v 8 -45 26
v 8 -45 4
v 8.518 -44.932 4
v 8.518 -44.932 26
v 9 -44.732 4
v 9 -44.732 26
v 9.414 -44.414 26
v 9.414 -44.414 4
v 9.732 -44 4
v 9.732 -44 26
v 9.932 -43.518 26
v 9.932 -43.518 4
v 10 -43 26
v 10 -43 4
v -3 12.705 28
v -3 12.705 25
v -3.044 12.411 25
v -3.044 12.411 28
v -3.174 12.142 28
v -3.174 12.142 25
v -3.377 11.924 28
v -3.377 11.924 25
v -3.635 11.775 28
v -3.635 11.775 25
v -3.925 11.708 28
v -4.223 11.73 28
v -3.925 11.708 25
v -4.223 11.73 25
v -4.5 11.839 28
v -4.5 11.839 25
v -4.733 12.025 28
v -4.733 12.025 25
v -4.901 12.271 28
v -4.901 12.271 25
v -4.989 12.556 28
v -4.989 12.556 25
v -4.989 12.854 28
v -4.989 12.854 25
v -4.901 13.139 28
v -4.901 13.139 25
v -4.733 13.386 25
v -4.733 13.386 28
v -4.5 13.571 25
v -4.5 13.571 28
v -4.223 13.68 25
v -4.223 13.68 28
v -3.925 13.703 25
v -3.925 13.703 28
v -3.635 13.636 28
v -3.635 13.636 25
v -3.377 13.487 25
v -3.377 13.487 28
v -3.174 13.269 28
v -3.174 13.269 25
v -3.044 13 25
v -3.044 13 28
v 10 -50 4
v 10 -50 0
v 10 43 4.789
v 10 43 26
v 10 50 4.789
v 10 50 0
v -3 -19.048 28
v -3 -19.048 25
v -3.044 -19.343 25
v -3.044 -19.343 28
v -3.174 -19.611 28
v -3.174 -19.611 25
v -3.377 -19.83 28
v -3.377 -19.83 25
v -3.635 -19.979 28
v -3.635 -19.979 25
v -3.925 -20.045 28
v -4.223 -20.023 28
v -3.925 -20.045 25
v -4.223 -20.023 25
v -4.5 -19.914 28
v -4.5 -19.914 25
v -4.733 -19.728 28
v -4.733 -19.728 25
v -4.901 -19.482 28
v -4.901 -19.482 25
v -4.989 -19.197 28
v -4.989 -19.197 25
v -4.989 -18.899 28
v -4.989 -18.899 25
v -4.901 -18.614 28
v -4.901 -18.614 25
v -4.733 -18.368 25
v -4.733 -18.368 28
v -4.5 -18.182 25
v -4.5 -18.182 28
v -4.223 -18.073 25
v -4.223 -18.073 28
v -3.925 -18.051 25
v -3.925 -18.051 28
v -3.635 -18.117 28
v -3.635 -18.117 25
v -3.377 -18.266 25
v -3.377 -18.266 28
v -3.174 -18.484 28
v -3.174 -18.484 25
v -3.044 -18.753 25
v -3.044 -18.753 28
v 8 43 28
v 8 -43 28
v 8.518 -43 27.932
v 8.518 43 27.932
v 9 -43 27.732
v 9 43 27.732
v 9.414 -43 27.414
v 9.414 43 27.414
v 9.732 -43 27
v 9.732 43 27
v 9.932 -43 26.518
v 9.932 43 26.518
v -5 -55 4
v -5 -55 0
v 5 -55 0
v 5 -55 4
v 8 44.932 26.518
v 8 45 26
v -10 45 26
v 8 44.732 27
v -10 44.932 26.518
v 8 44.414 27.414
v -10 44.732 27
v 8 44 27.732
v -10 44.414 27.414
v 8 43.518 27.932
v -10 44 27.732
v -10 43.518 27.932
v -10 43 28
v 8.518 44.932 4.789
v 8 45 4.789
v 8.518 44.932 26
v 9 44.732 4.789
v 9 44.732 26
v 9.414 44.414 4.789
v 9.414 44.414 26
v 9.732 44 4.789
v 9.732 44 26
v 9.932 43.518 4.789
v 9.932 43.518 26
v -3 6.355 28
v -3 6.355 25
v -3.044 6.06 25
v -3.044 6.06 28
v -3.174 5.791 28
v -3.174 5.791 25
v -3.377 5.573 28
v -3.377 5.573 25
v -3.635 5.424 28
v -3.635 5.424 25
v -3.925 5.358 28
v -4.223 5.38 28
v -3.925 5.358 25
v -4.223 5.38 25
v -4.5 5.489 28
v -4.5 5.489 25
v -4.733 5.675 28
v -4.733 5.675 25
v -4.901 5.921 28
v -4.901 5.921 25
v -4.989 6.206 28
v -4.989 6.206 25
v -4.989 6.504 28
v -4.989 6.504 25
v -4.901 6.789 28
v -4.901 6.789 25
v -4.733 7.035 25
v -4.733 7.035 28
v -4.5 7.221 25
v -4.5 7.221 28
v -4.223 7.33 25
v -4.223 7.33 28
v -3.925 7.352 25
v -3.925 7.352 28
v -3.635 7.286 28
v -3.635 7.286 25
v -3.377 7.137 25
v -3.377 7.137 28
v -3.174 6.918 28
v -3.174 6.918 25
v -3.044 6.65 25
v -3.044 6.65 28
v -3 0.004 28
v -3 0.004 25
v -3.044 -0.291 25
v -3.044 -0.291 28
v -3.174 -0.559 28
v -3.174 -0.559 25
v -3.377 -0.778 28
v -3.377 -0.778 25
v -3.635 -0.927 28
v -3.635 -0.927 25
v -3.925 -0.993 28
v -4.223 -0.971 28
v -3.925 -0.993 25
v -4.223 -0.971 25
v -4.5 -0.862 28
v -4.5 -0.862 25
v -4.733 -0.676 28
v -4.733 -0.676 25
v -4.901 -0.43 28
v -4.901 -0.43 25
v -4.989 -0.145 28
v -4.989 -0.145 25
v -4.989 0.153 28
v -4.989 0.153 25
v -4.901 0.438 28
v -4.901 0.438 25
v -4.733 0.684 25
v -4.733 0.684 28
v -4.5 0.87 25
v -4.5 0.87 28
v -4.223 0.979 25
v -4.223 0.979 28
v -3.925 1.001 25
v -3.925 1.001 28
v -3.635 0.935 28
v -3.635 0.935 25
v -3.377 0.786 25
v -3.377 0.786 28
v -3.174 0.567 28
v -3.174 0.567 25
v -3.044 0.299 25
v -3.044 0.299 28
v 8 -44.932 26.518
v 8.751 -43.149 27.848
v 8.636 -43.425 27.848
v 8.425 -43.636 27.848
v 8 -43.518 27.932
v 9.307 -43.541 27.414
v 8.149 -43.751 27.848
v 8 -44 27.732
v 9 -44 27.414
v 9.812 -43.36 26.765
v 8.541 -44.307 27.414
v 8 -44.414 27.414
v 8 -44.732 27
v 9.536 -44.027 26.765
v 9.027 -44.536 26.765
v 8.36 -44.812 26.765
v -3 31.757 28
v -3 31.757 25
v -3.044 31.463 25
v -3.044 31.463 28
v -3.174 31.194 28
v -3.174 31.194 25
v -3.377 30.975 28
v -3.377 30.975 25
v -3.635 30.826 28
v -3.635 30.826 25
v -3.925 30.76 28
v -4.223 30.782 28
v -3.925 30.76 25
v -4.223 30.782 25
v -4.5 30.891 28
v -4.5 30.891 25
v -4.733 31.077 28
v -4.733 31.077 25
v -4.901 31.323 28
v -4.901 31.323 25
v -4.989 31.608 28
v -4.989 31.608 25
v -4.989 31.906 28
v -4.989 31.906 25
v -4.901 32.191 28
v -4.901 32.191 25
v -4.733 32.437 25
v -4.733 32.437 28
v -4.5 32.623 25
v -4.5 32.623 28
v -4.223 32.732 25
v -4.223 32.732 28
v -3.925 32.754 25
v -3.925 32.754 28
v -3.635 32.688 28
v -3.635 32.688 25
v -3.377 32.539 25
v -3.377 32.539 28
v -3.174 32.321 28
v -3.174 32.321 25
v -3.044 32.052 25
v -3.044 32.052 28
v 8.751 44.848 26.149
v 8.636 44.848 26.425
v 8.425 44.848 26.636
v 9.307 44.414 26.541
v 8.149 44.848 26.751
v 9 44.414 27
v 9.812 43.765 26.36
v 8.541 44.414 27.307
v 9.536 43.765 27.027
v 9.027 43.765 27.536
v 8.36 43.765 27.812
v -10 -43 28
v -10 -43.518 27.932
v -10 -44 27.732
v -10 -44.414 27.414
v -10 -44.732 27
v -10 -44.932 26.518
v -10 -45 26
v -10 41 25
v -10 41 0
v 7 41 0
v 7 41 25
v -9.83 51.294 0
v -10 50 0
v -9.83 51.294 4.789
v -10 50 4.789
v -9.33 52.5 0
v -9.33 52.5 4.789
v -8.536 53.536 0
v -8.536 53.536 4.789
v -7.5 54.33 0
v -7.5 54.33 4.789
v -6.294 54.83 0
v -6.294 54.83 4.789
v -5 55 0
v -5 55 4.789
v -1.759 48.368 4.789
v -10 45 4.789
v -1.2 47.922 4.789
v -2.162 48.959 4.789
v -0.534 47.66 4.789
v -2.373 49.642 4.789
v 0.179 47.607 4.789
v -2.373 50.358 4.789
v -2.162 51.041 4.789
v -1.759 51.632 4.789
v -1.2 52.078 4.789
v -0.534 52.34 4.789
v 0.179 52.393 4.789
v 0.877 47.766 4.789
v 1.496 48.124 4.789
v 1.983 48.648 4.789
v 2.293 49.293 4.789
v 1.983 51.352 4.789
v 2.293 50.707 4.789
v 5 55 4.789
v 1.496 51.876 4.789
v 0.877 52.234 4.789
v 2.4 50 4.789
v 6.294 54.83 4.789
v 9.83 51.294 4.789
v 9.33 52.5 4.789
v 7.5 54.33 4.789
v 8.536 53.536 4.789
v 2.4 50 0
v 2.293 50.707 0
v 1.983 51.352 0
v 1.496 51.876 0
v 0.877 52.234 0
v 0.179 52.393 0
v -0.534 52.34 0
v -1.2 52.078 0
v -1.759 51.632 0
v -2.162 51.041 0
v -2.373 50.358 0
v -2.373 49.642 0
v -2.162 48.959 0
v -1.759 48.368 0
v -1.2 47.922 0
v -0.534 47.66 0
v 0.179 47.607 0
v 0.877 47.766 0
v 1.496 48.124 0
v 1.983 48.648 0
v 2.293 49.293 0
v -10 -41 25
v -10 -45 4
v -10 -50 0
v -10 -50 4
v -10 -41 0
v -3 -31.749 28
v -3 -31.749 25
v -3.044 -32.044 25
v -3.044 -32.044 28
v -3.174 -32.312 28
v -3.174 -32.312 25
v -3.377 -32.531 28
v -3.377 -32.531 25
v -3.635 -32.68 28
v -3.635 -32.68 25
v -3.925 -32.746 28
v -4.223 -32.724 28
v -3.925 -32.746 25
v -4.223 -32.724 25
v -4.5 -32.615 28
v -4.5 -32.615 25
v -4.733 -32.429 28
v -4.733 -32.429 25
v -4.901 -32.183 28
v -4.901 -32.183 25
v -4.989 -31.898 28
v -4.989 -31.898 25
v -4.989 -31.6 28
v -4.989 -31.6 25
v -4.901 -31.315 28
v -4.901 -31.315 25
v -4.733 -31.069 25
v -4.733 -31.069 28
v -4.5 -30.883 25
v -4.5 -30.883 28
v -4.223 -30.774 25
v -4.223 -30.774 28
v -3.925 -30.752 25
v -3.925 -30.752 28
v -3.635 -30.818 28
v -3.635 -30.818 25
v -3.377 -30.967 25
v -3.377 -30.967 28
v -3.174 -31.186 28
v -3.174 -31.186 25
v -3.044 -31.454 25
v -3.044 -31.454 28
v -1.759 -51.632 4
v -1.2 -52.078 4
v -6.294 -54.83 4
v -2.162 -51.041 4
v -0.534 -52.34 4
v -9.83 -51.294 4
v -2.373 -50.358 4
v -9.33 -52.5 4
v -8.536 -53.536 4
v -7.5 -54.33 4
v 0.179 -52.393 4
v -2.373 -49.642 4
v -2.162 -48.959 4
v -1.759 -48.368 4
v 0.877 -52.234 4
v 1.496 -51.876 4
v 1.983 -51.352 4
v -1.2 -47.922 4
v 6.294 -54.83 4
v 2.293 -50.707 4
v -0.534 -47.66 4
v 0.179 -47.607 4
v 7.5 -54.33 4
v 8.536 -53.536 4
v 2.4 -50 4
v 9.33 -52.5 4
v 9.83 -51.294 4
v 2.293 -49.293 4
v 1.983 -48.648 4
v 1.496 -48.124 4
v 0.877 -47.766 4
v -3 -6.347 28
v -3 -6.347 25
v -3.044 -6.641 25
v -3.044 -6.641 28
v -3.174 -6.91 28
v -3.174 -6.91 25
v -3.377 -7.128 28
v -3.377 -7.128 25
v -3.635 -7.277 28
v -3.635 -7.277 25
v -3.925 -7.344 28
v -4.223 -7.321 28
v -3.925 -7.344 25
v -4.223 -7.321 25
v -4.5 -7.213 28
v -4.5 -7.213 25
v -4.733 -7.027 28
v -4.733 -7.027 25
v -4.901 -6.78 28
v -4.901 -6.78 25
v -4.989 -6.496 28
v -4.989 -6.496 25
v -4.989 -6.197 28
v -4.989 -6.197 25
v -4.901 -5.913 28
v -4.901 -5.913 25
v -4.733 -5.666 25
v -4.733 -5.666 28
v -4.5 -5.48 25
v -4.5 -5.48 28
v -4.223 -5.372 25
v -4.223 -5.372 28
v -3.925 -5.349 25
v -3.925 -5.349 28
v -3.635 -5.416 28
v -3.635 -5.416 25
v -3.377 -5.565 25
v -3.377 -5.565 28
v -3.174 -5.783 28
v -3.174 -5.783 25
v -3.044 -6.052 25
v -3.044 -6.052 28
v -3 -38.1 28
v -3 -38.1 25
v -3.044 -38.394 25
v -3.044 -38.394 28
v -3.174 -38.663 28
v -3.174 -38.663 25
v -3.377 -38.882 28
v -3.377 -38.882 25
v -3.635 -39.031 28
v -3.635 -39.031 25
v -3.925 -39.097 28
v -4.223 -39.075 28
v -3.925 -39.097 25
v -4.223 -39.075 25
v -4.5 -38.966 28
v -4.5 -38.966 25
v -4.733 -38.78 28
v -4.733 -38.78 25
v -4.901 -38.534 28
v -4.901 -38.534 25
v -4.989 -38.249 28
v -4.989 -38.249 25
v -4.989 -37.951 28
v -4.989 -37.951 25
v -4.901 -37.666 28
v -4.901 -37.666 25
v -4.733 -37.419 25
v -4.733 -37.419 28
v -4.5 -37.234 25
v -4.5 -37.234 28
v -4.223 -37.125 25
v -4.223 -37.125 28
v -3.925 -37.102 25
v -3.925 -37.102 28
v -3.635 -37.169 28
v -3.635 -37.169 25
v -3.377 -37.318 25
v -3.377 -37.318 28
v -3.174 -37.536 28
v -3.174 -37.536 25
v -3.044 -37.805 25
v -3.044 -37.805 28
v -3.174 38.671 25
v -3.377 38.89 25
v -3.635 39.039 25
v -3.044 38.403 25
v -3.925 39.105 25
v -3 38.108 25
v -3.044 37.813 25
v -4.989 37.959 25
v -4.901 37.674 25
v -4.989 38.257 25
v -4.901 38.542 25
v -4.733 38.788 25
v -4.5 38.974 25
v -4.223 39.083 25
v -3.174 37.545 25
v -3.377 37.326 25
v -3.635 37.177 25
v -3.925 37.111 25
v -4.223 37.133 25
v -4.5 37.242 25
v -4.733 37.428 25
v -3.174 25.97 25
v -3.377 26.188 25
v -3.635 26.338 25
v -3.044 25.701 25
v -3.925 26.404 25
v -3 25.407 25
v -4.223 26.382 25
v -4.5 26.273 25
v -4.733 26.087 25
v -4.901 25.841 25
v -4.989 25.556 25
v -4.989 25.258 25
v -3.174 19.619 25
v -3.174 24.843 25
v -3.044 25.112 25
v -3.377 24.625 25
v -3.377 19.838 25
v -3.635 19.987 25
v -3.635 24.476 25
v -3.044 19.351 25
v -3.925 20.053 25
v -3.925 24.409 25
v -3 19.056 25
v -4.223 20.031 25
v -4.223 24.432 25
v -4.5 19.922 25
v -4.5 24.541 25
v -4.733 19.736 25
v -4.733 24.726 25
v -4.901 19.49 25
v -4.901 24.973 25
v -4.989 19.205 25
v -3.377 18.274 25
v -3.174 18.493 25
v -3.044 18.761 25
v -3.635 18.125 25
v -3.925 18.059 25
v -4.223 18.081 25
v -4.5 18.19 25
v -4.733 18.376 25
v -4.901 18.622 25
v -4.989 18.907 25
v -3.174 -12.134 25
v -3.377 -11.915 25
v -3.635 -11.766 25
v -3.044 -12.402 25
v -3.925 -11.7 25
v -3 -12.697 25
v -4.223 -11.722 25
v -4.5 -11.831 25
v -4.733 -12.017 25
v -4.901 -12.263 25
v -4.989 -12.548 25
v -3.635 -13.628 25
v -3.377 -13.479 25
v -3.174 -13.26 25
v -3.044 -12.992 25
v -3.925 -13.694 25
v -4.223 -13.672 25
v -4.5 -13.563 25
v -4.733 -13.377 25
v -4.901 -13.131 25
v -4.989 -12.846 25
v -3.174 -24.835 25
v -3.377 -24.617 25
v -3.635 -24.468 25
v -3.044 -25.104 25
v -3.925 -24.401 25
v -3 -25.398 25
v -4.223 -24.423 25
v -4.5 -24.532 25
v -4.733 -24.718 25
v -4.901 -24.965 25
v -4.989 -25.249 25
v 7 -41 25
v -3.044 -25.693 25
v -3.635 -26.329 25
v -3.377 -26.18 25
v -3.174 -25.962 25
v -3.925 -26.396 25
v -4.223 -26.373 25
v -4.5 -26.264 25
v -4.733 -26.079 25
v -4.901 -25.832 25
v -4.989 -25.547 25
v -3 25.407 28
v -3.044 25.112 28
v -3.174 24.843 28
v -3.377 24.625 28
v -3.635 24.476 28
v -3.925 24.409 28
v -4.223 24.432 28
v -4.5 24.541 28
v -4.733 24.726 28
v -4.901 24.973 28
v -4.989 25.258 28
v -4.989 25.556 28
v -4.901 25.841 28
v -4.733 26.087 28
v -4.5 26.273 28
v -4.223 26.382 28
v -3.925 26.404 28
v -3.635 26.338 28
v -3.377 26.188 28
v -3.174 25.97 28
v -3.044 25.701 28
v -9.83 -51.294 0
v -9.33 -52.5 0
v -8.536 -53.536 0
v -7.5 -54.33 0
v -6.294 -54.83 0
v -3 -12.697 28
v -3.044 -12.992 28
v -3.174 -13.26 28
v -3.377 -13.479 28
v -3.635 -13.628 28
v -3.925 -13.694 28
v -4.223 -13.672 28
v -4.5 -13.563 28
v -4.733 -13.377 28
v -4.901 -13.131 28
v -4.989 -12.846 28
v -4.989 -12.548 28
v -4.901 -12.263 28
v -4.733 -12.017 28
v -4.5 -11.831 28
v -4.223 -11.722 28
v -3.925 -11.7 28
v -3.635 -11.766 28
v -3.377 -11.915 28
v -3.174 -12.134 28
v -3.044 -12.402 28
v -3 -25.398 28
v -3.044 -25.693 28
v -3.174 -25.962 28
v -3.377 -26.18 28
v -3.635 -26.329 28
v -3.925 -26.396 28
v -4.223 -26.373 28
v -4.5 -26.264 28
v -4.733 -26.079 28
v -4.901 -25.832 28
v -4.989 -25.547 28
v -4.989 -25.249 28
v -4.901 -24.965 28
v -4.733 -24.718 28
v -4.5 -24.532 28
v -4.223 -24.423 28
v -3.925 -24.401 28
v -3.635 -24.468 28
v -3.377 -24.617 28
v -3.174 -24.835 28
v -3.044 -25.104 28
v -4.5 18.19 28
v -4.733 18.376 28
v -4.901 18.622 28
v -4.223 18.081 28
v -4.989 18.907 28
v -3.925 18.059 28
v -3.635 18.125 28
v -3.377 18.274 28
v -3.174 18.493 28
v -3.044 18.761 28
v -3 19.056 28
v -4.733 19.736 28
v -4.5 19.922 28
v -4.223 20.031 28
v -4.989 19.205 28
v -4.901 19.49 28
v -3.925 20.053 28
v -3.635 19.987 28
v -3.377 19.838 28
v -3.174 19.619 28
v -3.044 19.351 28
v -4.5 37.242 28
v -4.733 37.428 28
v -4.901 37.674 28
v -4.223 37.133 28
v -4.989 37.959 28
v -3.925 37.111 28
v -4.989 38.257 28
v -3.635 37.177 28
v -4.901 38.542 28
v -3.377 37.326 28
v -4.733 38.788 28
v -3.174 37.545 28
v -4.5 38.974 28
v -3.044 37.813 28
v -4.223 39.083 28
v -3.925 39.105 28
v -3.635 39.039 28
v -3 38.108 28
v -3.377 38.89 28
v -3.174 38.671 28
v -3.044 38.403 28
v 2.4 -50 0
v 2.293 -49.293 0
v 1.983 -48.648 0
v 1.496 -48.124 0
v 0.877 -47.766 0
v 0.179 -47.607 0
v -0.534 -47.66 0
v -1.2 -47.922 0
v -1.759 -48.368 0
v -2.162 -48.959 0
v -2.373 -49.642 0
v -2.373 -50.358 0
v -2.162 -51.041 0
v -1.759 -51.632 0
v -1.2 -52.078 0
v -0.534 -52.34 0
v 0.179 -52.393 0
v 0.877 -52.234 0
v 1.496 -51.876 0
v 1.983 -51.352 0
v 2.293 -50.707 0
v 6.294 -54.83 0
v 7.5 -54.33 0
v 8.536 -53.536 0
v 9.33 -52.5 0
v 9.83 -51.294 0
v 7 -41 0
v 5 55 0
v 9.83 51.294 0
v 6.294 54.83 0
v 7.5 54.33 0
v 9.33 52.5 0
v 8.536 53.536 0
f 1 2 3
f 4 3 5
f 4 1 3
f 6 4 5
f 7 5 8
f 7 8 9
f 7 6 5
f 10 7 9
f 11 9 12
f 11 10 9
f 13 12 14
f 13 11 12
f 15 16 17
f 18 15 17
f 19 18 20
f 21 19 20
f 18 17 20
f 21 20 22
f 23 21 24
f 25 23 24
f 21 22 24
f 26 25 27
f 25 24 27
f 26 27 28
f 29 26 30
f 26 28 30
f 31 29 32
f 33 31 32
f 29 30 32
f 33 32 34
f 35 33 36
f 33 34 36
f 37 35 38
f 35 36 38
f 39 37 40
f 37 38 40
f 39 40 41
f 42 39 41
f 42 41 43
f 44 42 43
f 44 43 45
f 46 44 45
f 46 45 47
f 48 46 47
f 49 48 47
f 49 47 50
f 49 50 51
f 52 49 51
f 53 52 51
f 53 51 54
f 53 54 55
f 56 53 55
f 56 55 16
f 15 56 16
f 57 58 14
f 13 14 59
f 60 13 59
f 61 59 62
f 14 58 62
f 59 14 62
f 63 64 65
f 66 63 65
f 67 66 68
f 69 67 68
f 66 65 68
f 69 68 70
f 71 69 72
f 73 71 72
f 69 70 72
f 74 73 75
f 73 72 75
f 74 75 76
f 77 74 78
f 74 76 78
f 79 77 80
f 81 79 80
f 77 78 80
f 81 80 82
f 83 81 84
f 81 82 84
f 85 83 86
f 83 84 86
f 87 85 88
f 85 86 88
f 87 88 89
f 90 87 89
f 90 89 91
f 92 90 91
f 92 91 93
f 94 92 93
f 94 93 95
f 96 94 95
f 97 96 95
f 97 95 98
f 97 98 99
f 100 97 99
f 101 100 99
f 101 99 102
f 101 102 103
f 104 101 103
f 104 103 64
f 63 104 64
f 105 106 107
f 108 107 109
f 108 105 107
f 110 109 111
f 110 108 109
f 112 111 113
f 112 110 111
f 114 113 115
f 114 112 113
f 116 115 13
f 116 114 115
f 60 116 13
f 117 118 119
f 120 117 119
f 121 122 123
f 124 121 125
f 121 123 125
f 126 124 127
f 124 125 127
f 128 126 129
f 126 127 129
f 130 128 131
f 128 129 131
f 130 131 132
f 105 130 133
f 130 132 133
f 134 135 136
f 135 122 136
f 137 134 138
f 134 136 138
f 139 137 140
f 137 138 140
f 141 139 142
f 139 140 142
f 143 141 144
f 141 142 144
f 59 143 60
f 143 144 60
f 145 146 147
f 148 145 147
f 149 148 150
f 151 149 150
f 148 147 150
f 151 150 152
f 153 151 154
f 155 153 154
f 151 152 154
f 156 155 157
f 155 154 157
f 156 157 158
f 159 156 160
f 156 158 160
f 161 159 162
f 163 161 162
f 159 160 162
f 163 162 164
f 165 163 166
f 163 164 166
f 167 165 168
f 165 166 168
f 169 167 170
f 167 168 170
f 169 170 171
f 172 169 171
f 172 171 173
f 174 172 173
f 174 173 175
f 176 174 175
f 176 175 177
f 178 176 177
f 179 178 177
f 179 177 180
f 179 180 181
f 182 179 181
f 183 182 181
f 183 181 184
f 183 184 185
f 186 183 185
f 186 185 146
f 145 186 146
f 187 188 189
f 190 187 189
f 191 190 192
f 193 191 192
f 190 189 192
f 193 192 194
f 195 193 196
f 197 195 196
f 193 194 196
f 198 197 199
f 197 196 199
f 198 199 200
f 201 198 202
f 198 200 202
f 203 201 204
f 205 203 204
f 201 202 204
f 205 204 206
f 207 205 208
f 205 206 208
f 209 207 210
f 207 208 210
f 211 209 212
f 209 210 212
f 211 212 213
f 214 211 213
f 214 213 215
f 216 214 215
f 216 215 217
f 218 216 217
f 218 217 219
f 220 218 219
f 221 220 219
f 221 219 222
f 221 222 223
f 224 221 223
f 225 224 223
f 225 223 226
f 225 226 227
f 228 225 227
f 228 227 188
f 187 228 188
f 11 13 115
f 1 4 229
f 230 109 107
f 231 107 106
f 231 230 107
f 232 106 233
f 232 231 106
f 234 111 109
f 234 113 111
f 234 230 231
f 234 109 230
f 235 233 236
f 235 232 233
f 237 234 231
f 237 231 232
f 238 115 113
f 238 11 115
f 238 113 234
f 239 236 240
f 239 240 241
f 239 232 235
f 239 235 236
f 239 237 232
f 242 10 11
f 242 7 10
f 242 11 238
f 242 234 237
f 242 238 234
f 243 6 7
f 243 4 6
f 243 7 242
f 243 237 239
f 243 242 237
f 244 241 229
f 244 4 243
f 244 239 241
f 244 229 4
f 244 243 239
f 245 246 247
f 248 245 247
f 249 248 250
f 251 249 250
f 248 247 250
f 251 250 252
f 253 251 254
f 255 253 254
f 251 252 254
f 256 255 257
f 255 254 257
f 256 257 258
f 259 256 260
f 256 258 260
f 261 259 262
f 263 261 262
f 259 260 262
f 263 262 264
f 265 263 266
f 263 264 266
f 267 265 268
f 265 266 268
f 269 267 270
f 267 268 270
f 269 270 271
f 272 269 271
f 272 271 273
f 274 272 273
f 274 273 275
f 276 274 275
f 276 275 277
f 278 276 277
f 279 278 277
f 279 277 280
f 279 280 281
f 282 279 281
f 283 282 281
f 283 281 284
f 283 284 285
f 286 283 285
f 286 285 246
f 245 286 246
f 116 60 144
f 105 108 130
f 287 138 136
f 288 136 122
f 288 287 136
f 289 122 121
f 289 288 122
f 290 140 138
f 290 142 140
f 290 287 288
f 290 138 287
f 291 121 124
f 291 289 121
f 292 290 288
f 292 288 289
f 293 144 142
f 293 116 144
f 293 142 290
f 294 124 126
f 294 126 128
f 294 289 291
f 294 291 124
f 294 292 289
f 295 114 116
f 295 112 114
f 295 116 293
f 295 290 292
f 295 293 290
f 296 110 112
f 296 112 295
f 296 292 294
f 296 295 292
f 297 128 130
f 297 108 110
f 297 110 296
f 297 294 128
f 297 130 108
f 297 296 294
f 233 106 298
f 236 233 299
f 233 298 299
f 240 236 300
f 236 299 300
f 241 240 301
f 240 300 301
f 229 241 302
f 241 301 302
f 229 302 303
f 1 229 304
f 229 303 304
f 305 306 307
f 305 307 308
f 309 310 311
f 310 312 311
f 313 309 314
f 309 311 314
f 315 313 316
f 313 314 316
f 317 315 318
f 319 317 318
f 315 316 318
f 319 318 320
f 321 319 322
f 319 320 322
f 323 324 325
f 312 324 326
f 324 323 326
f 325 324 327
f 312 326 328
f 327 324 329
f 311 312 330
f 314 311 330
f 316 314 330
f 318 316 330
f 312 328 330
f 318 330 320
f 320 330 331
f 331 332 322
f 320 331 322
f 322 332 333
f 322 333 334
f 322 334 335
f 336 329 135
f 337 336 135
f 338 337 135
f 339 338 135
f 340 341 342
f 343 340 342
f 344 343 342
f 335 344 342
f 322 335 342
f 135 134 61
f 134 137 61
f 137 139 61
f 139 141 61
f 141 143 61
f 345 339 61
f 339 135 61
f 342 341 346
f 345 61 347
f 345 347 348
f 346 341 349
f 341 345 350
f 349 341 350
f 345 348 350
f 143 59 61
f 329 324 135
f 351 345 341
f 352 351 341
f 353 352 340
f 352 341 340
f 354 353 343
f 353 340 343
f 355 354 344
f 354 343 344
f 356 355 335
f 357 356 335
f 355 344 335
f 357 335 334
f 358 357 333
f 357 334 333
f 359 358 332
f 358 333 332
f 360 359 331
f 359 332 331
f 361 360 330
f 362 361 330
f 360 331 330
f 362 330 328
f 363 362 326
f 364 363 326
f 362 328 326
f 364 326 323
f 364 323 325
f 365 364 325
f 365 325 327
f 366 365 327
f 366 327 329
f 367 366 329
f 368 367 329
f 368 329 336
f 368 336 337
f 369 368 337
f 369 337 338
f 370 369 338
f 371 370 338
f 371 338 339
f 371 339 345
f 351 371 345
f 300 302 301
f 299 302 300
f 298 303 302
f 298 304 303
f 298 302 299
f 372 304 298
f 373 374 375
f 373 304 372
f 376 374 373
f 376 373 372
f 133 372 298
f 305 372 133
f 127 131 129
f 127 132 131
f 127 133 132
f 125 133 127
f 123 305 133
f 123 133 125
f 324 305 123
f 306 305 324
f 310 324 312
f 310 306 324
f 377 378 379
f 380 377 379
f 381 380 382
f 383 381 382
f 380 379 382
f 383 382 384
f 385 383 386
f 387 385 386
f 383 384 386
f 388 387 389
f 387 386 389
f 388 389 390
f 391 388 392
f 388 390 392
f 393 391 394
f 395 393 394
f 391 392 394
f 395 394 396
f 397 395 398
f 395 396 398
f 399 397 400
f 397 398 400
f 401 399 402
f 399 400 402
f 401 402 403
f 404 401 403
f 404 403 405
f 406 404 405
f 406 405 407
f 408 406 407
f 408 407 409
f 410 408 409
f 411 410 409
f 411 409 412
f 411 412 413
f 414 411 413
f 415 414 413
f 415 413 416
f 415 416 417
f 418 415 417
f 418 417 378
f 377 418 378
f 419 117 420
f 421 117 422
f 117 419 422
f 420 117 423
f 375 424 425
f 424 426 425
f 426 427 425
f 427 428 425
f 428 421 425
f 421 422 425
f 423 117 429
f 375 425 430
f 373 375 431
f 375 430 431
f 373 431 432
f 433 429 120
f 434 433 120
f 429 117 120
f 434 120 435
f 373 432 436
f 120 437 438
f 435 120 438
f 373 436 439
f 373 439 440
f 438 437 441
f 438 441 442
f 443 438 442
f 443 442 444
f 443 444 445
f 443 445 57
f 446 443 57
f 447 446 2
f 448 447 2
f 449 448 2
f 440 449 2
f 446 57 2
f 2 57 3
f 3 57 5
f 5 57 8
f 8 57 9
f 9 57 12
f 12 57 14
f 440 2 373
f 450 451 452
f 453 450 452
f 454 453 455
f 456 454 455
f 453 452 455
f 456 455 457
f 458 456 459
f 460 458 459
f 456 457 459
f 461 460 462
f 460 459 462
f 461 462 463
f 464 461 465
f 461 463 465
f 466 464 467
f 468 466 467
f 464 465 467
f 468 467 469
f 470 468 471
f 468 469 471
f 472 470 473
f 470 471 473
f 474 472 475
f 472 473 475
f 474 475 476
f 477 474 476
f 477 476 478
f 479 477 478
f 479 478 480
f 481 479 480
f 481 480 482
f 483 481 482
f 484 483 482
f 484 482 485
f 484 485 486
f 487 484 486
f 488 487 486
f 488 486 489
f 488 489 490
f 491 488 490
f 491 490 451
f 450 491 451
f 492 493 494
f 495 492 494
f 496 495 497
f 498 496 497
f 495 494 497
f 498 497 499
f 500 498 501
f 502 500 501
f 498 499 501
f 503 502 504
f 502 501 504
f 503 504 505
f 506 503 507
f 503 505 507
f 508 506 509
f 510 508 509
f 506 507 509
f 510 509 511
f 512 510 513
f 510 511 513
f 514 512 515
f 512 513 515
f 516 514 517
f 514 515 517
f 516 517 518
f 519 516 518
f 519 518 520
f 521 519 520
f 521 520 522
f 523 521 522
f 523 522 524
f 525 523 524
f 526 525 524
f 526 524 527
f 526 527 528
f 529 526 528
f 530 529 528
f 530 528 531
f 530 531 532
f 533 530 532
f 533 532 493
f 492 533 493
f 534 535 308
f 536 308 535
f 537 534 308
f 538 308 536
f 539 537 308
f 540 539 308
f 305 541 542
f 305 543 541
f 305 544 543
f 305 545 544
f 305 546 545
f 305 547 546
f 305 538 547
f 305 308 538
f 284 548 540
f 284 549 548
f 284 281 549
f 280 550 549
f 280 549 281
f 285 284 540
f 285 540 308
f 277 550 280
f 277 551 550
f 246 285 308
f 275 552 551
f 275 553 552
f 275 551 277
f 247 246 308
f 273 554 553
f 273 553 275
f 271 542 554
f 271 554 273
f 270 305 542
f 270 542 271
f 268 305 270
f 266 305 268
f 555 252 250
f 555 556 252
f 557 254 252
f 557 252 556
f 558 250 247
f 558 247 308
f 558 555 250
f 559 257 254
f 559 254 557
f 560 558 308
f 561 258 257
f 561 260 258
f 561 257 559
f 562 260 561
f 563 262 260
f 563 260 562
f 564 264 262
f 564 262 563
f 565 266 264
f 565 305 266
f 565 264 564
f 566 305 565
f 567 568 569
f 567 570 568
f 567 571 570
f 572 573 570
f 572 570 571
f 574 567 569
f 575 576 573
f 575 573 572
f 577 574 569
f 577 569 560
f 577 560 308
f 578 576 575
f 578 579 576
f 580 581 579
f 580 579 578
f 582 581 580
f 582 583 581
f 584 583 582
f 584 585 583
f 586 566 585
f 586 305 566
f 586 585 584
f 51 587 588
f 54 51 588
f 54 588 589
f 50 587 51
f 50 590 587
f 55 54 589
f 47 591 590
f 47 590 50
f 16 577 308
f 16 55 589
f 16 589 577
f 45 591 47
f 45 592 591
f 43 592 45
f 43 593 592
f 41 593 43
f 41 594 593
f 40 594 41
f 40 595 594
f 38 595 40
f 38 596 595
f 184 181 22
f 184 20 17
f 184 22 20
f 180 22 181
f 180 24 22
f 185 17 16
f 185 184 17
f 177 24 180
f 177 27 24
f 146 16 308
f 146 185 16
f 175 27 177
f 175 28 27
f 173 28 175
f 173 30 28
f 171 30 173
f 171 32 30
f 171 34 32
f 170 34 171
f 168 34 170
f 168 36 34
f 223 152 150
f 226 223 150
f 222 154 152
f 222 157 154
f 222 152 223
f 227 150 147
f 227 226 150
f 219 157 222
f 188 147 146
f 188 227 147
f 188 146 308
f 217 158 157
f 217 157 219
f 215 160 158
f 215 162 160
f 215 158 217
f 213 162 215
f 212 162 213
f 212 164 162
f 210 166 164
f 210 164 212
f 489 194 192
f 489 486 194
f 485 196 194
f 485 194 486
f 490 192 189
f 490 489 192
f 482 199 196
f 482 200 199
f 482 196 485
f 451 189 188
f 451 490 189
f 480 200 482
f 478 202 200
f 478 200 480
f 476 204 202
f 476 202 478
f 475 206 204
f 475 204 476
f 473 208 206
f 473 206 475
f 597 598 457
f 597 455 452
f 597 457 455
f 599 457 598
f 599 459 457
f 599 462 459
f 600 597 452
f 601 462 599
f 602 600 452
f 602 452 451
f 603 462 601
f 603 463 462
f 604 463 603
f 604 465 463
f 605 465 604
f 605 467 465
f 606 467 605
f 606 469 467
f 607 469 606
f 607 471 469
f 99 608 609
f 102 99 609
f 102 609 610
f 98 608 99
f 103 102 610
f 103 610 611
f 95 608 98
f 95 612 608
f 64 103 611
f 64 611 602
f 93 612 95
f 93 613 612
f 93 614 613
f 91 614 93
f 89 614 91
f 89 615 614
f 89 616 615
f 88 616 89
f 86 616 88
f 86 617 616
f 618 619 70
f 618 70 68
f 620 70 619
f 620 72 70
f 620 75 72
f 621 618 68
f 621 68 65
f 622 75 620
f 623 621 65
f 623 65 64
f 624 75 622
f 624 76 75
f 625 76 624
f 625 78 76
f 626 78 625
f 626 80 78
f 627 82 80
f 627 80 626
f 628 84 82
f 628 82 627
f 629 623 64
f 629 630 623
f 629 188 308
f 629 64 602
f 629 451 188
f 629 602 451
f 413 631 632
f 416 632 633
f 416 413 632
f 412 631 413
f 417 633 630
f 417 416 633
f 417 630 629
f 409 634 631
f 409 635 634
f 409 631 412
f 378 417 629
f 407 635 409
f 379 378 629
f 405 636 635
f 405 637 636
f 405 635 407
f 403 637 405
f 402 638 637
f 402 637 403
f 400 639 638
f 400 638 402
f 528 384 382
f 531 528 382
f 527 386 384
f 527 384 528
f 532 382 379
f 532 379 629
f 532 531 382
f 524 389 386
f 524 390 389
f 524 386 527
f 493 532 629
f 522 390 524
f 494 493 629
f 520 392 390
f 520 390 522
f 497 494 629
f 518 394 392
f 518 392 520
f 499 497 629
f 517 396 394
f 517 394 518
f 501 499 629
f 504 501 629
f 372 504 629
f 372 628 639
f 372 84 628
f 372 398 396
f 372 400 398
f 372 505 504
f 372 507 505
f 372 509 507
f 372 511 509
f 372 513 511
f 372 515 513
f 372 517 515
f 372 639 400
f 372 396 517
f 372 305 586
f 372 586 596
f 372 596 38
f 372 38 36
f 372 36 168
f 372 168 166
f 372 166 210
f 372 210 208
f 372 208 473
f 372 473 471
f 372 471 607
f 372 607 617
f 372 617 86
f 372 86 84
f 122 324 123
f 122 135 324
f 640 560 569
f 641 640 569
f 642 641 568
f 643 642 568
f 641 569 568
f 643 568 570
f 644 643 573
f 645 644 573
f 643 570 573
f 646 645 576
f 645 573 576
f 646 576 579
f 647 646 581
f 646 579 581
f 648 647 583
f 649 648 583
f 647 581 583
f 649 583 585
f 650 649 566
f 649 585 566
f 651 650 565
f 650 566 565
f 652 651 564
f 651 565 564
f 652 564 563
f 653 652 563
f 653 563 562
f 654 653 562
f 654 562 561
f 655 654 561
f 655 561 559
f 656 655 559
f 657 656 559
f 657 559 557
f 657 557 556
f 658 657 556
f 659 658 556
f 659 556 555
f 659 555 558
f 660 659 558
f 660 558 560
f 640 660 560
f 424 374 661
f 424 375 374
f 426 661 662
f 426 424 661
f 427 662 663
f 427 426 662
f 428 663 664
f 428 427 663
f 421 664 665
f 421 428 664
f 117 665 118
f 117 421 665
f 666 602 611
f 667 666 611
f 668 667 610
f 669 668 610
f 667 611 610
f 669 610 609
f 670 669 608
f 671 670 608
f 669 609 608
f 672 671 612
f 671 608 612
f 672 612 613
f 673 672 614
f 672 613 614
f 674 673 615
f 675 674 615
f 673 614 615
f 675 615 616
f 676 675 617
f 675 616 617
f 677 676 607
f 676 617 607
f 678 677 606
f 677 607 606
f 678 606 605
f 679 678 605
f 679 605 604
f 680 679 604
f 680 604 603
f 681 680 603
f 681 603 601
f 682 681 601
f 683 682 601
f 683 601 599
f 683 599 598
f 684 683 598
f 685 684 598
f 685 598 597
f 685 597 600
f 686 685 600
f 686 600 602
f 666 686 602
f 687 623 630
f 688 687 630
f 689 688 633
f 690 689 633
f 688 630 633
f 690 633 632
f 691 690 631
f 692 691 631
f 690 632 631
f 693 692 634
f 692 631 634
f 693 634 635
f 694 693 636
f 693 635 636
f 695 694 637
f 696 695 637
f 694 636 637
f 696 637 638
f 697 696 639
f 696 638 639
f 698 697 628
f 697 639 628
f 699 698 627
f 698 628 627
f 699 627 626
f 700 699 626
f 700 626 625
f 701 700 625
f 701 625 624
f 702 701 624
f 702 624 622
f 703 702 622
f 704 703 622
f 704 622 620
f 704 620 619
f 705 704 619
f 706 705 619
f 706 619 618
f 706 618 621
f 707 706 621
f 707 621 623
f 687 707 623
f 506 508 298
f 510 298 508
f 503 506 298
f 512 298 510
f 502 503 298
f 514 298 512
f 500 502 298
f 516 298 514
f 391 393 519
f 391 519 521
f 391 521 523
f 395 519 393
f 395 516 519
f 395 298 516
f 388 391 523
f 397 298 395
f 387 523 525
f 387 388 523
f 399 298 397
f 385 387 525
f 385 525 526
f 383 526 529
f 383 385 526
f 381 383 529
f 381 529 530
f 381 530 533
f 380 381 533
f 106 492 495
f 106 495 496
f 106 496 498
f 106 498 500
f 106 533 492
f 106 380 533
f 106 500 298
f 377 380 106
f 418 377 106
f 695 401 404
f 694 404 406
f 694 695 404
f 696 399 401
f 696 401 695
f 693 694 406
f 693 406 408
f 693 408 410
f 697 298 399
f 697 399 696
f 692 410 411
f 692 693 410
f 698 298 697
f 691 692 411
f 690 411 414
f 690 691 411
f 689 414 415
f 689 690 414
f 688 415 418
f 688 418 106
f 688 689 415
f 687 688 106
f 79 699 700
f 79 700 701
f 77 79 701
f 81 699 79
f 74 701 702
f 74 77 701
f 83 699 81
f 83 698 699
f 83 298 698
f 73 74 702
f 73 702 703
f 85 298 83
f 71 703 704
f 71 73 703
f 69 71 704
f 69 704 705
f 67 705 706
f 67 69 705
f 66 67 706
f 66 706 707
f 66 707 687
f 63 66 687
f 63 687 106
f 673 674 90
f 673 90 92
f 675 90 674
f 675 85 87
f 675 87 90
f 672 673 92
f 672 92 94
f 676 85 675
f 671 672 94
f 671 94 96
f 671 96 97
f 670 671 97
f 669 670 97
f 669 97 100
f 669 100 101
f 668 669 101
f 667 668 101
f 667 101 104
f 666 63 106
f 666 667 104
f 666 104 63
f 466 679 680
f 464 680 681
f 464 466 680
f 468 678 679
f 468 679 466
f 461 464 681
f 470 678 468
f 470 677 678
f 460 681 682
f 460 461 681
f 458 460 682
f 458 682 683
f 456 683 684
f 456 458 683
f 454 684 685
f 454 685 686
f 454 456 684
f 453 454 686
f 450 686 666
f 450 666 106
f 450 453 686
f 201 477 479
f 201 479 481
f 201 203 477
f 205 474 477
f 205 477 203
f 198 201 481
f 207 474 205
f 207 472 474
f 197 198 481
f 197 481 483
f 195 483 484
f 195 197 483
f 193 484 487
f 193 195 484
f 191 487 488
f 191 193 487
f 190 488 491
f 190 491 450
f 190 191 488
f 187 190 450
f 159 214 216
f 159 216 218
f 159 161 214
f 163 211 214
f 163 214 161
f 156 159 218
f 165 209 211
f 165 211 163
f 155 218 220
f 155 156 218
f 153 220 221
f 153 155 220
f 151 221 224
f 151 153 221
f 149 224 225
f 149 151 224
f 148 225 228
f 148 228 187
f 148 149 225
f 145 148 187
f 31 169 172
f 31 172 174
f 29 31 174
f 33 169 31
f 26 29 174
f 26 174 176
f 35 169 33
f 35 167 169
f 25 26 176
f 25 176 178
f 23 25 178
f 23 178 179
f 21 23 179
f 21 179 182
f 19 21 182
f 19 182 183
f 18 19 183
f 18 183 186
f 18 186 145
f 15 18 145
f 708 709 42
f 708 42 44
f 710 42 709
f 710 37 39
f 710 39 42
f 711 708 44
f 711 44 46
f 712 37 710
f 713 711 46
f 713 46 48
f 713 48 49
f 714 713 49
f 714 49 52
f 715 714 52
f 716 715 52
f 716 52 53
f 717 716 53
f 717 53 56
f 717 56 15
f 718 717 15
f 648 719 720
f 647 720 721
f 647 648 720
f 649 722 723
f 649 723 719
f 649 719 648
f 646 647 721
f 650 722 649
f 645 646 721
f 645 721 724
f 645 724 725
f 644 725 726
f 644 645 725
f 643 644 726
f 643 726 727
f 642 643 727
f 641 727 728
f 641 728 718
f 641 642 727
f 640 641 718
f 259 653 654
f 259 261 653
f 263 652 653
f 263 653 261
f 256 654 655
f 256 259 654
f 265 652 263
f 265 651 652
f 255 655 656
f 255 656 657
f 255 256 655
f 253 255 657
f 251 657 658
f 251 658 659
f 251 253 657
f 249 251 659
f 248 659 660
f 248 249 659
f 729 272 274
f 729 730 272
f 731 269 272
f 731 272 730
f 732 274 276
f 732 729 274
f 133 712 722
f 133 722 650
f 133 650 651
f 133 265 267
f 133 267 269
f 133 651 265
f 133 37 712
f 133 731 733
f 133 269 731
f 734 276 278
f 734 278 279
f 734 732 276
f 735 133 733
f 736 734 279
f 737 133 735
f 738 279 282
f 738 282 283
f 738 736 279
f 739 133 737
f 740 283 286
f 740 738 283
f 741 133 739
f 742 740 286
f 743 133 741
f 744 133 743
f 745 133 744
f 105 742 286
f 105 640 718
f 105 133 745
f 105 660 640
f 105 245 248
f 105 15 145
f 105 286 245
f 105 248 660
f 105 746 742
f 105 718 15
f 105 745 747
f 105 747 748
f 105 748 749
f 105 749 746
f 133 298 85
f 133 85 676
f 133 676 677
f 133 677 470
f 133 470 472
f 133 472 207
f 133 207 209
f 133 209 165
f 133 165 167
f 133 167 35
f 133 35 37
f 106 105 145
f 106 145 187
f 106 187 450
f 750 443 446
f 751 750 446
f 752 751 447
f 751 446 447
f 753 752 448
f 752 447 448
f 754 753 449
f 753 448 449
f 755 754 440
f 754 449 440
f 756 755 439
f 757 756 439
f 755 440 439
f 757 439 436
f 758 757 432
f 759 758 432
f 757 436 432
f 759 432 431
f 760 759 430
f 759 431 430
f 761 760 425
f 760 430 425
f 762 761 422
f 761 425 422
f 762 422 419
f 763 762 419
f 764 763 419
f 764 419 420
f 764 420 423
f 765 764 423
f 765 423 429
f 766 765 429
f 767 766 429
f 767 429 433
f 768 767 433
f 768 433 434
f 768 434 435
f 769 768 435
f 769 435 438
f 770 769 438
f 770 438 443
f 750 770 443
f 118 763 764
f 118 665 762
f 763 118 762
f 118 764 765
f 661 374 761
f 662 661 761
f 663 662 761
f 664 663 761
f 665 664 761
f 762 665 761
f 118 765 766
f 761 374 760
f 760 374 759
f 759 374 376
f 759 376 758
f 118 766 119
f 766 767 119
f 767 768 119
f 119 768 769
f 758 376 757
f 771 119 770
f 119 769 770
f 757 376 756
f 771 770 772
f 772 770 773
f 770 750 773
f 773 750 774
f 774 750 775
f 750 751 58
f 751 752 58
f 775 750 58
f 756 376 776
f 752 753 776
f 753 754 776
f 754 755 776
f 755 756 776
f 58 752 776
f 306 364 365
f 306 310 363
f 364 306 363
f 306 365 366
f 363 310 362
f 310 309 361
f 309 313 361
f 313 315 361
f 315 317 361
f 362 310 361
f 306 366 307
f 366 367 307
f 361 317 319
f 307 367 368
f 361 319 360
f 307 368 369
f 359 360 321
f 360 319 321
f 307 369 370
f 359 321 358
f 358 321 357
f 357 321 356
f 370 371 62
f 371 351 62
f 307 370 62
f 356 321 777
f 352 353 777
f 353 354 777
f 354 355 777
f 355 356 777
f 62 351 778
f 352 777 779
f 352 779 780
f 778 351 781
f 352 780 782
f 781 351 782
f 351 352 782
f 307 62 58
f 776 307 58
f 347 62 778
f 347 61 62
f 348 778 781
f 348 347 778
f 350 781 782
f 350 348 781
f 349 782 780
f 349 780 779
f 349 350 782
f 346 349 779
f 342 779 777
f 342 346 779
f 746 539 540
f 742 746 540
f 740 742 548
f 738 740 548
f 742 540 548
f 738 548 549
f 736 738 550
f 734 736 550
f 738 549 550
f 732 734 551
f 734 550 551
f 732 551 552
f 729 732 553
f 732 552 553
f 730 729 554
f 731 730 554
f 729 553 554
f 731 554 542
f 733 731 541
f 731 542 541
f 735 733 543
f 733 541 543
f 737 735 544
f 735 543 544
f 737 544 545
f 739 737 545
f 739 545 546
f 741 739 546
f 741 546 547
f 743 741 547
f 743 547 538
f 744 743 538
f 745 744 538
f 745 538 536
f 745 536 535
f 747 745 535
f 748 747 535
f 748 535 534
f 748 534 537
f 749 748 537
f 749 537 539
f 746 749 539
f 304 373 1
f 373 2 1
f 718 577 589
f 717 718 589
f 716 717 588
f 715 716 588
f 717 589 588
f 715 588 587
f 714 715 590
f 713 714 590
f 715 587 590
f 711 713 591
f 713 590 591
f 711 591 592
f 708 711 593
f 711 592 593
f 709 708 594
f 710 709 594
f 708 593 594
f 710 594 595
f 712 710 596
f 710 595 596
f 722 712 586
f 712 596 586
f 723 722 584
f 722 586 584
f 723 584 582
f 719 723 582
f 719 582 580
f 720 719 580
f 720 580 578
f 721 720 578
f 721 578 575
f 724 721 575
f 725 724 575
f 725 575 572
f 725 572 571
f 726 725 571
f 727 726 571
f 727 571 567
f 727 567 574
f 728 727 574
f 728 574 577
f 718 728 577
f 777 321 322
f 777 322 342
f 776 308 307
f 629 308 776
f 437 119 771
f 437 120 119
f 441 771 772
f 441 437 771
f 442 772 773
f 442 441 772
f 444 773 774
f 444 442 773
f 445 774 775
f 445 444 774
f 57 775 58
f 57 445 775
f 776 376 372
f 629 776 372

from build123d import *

# Parameters (mm, degrees)
SKETCH_W        = 20
SKETCH_H        = 110
PAD_DEPTH       = 28
SKETCH003_R     = 1
POCKET_DEPTH    = 28.001
SKETCH004_W     = 14
SKETCH004_H     = 25
SKETCH004_W_2   = 12.717113
SKETCH004_H_2   = 24.211324
POCKET001_DEPTH = 20.001
SKETCH005_W     = 82
SKETCH005_H     = 26
POCKET002_DEPTH = 17
SKETCH006_R     = 2.4
POCKET003_DEPTH = 5
FILLET_R        = 2
FILLET001_R     = 5


with BuildPart() as part:
    # Sketch → Pad (new body)
    with BuildSketch(Plane.XY):
        Rectangle(SKETCH_W, SKETCH_H)
    extrude(amount=PAD_DEPTH)

    # Sketch003 → Pocket (cut, through all)
    with BuildSketch(Plane(origin=(0, 0, 0), x_dir=(1, 0, 0), z_dir=(0, 0, -1))):
        with Locations((-4, -0.004117)):
            Circle(SKETCH003_R)
        with Locations((-4, 6.346514)):
            Circle(SKETCH003_R)
        with Locations((-4, 12.697146)):
            Circle(SKETCH003_R)
        with Locations((-4, -6.354749)):
            Circle(SKETCH003_R)
        with Locations((-4, 19.047777)):
            Circle(SKETCH003_R)
        with Locations((-4, 25.398409)):
            Circle(SKETCH003_R)
        with Locations((-4, 31.74904)):
            Circle(SKETCH003_R)
        with Locations((-4, 38.099672)):
            Circle(SKETCH003_R)
        with Locations((-4, -38.107906)):
            Circle(SKETCH003_R)
        with Locations((-4, -12.70538)):
            Circle(SKETCH003_R)
        with Locations((-4, -19.056012)):
            Circle(SKETCH003_R)
        with Locations((-4, -25.406643)):
            Circle(SKETCH003_R)
        with Locations((-4, -31.757274)):
            Circle(SKETCH003_R)
    extrude(amount=-POCKET_DEPTH, mode=Mode.SUBTRACT)

    # Sketch004 → Pocket001 (cut, through all)
    with BuildSketch(Plane.YZ.offset(10)):
        with Locations((-52, 16.5)):
            Rectangle(SKETCH004_W, SKETCH004_H)
        with Locations((51.358556, 16.894338)):
            Rectangle(SKETCH004_W_2, SKETCH004_H_2)
    extrude(amount=-POCKET001_DEPTH, mode=Mode.SUBTRACT)

    # Sketch005 → Pocket002 (cut)
    with BuildSketch(Plane(origin=(-10, 0, 0), x_dir=(0, -1, 0), z_dir=(-1, 0, 0))):
        with Locations((0, 12)):
            Rectangle(SKETCH005_W, SKETCH005_H)
    extrude(amount=-POCKET002_DEPTH, mode=Mode.SUBTRACT)

    # Sketch006 → Pocket003 (cut)
    with BuildSketch(Plane.XY.offset(4.788676)):
        with Locations((0, 50)):
            Circle(SKETCH006_R)
        with Locations((0, -50)):
            Circle(SKETCH006_R)
    extrude(amount=-POCKET003_DEPTH, mode=Mode.SUBTRACT)

    # Fillet
    fillet_edges = [part.edges().sort_by_distance(p)[0] for p in [
        (10, -45, 16),
        (10, 0, 28),
        (10, 45, 16.394338),
        (0, 45, 28),
        (0, -45, 28),
    ]]
    fillet(fillet_edges, radius=FILLET_R)

    # Fillet001
    fillet001_edges = [part.edges().sort_by_distance(p)[0] for p in [
        (10, 55, 2.394338),
        (-10, 55, 2.394338),
        (-10, -55, 2),
        (10, -55, 2),
    ]]
    fillet(fillet001_edges, radius=FILLET001_R)


solid = part.part
